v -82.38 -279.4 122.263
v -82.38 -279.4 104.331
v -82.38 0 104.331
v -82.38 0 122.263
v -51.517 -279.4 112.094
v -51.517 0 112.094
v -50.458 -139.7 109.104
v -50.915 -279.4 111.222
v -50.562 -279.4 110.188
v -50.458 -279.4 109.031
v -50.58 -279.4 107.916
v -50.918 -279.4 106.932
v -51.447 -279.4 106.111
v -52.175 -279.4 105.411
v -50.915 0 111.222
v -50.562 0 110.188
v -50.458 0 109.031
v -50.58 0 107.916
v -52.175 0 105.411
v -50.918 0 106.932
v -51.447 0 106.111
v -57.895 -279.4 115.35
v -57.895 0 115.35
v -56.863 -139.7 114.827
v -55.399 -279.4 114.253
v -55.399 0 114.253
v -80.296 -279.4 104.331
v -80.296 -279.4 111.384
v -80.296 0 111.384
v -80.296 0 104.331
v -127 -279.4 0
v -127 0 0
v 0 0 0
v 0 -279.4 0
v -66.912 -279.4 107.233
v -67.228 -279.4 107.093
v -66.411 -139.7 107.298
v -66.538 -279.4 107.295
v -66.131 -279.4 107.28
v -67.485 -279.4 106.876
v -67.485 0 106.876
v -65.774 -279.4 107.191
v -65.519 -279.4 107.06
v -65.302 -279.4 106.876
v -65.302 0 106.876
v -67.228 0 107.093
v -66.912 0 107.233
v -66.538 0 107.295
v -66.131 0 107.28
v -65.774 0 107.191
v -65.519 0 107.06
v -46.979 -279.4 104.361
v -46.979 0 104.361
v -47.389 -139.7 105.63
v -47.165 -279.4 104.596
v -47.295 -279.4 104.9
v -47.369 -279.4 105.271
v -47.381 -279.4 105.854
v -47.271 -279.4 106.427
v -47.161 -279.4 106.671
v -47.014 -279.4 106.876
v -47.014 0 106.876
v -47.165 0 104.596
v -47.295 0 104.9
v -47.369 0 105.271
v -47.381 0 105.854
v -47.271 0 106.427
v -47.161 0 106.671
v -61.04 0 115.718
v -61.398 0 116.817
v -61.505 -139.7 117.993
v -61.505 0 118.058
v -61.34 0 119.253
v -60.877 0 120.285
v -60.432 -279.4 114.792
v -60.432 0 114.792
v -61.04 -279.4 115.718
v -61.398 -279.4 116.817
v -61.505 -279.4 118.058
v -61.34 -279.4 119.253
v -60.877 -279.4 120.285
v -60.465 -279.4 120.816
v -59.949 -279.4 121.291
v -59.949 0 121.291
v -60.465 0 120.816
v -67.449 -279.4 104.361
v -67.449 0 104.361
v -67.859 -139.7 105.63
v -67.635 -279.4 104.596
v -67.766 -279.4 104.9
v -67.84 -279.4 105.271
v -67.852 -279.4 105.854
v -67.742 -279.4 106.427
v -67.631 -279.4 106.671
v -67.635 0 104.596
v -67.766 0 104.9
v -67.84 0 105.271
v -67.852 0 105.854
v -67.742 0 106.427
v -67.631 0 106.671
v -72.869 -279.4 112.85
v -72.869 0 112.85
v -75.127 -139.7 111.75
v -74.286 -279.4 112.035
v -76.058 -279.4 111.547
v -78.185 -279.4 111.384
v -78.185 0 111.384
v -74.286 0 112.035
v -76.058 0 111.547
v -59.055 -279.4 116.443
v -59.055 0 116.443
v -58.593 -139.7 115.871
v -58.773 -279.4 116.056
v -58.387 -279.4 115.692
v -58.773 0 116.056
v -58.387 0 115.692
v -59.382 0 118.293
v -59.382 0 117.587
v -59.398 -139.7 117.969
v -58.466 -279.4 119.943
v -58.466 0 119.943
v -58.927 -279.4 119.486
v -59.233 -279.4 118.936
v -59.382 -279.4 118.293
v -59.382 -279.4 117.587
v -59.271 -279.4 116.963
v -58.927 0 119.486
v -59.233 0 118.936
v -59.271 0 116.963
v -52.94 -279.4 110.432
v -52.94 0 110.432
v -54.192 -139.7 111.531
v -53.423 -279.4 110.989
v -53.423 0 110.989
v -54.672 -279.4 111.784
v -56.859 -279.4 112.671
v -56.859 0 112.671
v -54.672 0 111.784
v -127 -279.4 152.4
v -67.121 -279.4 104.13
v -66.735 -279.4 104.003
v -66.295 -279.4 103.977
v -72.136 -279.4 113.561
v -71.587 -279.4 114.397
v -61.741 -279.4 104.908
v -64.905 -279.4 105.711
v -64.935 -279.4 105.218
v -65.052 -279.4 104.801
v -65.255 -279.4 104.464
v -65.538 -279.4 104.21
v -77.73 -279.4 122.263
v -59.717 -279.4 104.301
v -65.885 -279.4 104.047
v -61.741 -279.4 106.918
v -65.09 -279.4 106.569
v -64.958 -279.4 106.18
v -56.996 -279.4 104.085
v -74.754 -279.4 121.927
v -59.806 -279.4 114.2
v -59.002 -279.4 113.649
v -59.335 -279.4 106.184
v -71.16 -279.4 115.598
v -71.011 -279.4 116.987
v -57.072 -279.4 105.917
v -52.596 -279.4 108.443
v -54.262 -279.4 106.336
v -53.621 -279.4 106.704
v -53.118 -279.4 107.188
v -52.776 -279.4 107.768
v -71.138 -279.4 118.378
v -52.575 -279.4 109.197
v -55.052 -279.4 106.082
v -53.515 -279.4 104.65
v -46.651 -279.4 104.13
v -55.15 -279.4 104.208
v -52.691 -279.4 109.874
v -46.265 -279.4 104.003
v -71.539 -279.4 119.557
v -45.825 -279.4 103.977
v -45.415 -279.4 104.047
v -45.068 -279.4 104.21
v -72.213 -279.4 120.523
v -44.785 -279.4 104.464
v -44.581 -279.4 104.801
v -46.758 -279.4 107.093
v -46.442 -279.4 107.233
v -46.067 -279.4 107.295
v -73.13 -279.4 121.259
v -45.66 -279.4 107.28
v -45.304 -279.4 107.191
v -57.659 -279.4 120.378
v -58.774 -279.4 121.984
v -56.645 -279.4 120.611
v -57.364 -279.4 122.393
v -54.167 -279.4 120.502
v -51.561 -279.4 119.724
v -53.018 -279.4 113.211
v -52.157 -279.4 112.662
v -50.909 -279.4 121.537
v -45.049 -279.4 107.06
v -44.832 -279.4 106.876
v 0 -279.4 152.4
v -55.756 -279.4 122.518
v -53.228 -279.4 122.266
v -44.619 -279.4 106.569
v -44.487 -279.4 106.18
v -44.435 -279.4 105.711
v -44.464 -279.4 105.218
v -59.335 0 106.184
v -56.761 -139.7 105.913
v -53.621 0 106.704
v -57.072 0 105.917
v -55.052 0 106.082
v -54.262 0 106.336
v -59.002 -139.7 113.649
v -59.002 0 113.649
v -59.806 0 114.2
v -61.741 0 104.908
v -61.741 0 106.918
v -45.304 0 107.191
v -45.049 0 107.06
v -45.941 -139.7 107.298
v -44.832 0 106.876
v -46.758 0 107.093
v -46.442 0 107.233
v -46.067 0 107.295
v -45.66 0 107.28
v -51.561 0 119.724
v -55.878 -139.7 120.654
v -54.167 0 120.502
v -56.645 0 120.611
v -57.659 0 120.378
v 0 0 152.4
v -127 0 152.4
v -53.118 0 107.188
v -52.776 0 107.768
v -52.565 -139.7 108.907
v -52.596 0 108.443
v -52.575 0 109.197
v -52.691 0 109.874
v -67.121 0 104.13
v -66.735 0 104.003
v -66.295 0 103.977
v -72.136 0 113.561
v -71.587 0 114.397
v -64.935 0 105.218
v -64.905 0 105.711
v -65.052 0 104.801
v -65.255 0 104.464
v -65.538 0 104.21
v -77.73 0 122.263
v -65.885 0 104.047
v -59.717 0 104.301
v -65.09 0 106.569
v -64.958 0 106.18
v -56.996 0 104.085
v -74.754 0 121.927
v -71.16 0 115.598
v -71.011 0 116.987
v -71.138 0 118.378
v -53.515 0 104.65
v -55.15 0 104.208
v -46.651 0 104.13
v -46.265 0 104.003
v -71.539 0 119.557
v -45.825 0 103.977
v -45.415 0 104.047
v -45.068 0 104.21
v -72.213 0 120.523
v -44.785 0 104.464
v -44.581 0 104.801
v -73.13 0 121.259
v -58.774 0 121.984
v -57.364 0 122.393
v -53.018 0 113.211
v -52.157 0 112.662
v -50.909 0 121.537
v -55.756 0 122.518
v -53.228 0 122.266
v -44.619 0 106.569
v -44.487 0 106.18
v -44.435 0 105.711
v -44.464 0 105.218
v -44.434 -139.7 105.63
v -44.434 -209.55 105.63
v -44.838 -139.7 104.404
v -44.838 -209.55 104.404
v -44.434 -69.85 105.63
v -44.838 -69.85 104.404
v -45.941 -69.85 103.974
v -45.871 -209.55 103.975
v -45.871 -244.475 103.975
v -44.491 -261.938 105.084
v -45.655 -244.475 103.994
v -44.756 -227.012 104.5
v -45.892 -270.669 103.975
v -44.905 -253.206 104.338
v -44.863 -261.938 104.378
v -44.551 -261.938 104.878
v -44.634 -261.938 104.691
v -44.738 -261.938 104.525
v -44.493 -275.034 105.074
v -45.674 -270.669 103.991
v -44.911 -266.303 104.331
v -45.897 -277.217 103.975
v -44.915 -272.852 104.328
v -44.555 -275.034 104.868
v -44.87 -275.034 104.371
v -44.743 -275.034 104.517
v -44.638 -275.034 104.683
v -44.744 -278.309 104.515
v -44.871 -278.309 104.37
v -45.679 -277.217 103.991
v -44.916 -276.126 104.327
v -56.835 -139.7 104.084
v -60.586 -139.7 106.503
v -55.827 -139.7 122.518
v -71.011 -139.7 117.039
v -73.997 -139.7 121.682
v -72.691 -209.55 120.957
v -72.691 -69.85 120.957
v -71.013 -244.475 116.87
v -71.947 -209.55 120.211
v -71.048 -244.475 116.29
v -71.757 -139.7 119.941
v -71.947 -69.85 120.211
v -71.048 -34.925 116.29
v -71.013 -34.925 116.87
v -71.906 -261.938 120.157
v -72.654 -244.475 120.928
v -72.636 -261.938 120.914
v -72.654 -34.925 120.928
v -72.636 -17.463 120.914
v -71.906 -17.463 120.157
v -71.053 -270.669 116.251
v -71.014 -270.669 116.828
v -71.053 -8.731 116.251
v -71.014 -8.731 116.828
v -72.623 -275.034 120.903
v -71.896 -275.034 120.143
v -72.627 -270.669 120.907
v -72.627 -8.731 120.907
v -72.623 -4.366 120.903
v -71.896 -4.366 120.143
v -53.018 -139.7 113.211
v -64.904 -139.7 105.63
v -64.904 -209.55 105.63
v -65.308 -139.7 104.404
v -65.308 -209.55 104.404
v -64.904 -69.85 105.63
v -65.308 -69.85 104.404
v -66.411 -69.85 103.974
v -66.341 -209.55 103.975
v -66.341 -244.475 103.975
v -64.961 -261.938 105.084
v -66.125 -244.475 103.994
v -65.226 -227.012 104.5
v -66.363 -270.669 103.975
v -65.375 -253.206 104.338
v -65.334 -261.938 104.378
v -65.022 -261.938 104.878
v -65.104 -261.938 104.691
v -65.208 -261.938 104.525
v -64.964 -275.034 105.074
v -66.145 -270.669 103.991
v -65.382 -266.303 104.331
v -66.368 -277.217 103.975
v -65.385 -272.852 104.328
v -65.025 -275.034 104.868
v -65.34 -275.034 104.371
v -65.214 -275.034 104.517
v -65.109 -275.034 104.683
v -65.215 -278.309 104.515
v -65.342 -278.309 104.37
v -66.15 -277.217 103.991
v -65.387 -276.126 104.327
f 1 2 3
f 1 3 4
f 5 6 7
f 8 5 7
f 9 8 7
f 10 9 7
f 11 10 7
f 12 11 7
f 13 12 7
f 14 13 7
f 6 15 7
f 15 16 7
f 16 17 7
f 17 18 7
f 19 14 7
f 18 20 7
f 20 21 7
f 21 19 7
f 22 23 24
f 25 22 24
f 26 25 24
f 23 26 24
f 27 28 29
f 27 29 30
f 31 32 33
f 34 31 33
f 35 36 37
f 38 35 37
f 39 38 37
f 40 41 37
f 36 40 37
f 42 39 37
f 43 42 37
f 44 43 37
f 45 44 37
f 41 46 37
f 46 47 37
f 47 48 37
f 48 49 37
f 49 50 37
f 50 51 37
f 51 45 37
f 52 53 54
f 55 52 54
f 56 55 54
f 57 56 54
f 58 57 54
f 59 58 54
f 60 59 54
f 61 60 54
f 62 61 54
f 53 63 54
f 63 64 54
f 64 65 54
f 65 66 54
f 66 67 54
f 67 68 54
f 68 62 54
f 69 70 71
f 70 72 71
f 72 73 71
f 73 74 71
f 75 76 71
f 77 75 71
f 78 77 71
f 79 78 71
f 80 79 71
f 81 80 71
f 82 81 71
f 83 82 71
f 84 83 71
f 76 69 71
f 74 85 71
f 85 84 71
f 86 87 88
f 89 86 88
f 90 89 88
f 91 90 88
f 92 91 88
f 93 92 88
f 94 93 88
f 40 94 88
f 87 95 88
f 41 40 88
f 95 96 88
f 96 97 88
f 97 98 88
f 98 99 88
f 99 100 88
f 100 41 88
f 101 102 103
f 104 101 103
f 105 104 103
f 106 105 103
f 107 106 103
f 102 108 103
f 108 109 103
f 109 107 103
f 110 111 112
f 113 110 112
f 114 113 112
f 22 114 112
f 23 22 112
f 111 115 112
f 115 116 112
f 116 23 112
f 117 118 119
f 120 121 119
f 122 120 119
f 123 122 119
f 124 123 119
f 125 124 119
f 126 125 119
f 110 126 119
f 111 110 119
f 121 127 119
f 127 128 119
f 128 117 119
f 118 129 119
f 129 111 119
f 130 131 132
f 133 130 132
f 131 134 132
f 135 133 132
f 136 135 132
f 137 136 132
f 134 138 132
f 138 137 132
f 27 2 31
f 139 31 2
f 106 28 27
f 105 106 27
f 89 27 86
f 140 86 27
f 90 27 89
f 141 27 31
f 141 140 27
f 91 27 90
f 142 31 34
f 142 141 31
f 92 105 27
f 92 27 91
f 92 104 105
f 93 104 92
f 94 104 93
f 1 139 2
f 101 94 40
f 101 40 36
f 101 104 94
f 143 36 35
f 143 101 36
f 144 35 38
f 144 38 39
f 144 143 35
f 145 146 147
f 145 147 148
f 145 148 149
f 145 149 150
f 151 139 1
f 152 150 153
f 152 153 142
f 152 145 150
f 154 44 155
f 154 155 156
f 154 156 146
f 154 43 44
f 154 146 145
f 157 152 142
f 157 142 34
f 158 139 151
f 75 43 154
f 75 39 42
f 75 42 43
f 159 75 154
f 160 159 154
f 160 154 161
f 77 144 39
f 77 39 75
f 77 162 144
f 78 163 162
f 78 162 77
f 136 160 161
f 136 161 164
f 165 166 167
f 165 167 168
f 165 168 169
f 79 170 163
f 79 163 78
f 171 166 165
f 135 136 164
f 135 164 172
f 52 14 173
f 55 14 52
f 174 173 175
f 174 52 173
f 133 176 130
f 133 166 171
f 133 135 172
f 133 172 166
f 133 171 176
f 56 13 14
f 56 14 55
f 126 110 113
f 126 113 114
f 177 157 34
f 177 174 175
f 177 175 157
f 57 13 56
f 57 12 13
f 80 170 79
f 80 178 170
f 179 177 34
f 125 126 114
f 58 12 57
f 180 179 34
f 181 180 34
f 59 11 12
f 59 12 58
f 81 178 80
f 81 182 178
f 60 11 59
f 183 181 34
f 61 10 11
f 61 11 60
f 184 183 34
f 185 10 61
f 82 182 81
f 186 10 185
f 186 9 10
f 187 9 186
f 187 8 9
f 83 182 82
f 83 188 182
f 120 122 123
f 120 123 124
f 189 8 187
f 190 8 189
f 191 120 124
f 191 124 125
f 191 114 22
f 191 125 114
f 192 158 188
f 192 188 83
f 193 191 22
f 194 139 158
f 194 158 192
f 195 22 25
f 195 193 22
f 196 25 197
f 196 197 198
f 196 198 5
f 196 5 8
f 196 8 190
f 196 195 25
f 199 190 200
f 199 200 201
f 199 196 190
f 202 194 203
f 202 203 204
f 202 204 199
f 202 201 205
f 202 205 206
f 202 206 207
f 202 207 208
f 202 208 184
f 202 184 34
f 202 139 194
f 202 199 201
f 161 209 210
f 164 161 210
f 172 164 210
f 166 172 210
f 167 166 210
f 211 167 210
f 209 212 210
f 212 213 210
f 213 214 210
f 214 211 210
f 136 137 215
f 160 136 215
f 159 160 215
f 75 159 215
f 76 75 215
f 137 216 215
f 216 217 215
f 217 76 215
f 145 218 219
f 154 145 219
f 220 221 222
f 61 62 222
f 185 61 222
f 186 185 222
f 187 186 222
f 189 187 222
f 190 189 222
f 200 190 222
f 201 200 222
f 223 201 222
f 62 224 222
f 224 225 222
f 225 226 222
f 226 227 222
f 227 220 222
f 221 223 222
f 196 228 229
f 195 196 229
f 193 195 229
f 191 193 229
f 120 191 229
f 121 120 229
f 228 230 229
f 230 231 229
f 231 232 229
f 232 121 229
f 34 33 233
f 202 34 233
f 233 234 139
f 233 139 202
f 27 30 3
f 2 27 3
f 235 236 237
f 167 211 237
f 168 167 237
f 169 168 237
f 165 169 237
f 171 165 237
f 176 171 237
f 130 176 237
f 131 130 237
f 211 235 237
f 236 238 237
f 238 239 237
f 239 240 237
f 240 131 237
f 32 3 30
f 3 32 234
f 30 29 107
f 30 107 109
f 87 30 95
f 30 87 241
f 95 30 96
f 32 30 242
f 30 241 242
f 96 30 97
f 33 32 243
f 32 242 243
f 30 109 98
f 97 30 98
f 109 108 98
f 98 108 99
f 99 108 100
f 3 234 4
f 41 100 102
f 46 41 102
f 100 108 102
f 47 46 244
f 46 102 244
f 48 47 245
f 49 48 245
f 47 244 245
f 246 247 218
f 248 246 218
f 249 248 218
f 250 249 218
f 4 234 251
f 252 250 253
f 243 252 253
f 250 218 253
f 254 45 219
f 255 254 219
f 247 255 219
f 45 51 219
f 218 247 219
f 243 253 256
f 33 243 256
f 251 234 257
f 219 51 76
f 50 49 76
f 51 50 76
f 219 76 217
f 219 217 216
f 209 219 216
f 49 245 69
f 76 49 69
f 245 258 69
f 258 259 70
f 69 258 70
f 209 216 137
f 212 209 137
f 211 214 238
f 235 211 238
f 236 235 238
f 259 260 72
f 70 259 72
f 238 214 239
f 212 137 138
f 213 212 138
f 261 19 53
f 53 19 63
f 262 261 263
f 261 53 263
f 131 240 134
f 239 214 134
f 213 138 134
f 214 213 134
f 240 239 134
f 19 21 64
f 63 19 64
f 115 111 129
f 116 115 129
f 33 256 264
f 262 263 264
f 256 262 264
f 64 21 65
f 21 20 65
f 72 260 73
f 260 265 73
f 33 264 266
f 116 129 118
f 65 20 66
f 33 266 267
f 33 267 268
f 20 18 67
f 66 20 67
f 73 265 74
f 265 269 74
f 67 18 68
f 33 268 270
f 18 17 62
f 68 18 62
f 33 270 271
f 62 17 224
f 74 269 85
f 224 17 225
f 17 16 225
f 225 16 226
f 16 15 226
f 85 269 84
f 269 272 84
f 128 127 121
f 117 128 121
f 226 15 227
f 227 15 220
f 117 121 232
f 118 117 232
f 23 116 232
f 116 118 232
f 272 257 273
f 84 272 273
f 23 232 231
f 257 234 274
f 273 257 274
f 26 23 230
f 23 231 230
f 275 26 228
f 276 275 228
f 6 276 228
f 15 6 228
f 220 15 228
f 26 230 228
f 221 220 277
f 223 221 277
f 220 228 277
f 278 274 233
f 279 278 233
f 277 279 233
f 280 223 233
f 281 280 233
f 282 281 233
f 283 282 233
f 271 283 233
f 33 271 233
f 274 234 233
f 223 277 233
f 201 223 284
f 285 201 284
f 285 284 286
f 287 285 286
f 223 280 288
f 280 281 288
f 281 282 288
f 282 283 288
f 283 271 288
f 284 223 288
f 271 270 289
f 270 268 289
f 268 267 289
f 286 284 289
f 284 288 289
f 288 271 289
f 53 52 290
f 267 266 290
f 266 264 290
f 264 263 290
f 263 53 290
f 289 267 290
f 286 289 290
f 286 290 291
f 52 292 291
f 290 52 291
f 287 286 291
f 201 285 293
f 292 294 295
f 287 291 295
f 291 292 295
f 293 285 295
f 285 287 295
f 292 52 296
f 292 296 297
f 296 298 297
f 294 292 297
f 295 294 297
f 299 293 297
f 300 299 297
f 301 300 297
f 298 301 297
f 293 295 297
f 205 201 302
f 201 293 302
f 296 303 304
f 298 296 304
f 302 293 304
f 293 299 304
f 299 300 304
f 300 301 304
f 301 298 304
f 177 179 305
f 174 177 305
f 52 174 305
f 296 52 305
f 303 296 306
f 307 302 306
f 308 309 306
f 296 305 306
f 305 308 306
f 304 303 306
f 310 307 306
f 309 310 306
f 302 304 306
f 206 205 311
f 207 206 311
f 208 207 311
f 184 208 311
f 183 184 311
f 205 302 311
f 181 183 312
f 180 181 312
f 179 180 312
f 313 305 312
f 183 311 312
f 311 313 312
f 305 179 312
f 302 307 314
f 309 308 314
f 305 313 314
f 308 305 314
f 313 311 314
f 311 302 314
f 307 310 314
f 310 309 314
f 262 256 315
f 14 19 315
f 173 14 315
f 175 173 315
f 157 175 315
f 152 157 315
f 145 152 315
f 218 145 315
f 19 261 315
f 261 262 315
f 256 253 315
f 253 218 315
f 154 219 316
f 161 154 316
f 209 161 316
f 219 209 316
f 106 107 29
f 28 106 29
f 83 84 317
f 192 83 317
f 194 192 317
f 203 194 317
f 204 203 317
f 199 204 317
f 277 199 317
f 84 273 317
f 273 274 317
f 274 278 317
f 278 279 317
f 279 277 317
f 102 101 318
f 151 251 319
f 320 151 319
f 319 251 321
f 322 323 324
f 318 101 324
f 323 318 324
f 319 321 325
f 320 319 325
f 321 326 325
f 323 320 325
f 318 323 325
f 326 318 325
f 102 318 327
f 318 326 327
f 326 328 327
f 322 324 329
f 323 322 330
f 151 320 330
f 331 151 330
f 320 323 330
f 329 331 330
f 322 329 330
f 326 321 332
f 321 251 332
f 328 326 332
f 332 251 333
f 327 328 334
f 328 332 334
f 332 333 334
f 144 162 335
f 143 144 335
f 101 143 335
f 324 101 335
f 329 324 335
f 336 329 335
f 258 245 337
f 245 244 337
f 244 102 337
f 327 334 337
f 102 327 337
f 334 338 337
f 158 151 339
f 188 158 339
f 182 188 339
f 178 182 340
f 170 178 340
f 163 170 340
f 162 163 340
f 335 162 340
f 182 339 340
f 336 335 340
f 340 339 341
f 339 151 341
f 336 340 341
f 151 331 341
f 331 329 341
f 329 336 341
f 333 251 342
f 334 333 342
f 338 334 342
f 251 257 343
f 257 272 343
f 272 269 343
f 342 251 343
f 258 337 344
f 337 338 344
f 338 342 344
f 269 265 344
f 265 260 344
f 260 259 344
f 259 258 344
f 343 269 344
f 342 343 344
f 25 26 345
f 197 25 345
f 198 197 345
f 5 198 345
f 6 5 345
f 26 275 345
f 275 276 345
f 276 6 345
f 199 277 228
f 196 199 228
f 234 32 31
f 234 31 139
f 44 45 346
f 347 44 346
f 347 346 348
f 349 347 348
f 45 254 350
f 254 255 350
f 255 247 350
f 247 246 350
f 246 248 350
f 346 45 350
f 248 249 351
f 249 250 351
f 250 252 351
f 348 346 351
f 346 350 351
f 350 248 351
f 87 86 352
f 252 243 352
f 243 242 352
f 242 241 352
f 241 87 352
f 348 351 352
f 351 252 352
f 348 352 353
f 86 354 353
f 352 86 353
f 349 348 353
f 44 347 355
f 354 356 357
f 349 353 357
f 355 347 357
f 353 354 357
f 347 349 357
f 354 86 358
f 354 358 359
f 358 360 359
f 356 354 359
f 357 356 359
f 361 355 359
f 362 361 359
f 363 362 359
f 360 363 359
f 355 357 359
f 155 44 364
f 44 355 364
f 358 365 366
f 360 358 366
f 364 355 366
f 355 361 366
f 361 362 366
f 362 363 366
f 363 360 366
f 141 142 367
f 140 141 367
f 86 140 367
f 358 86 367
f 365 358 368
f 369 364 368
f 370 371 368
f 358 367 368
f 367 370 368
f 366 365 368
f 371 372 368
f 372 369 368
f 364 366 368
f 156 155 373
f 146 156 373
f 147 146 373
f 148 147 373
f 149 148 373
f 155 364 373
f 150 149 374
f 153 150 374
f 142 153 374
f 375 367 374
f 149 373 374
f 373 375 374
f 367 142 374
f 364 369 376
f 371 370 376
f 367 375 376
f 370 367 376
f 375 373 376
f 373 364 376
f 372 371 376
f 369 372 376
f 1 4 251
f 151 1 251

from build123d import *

# Parameters (mm, degrees)
F0_W     = 127
F0_H     = 152.4
F1_DEPTH = 279.4


with BuildPart() as f1:
    # F0 (on Front) → F1 (new body)
    with BuildSketch(Plane.XZ):
        with Locations((-63.5, 76.2)):
            Rectangle(F0_W, F0_H)
        with BuildLine():
            add(Edge.make_bspline(
                [(-77.7296743618, 122.2627671523), (-71.0107954947, 122.2627671523), (-71.0107954947, 117.0391527994)],
                knots=[0, 0, 0, 1, 1, 1], degree=2))
            add(Edge.make_bspline(
                [(-71.0107954947, 117.0391527994), (-71.0107954947, 114.3154951278), (-72.8690835458, 112.8496649544)],
                knots=[0, 0, 0, 1, 1, 1], degree=2))
            add(Edge.make_bspline(
                [(-72.8690835458, 112.8496649544), (-74.727371597, 111.383834781), (-78.1849255, 111.383834781)],
                knots=[0, 0, 0, 1, 1, 1], degree=2))
            Line((-78.1849255, 111.383834781), (-80.2963488823, 111.383834781))
            Line((-80.2963488823, 111.383834781), (-80.2963488823, 104.3313667178))
            Line((-80.2963488823, 104.3313667178), (-82.3803002131, 104.3313667178))
            Line((-82.3803002131, 104.3313667178), (-82.3803002131, 122.2627671523))
            Line((-82.3803002131, 122.2627671523), (-77.7296743618, 122.2627671523))
        make_face(mode=Mode.SUBTRACT)
        with BuildLine():
            add(Edge.make_bspline(
                [(-67.4492402541, 104.3608010586), (-67.8593587363, 104.7473720682), (-67.8593587363, 105.6304022932)],
                knots=[0, 0, 0, 1, 1, 1], degree=2))
            add(Edge.make_bspline(
                [(-67.8593587363, 105.6304022932), (-67.8593587363, 106.4545638365), (-67.4845614631, 106.876456055)],
                knots=[0, 0, 0, 1, 1, 1], degree=2))
            add(Edge.make_bspline(
                [(-67.4845614631, 106.876456055), (-67.1097641898, 107.2983482736), (-66.4111891674, 107.2983482736)],
                knots=[0, 0, 0, 1, 1, 1], degree=2))
            add(Edge.make_bspline(
                [(-66.4111891674, 107.2983482736), (-65.7008404087, 107.2983482736), (-65.3024956628, 106.876456055)],
                knots=[0, 0, 0, 1, 1, 1], degree=2))
            add(Edge.make_bspline(
                [(-65.3024956628, 106.876456055), (-64.9041509168, 106.4545638365), (-64.9041509168, 105.6304022932)],
                knots=[0, 0, 0, 1, 1, 1], degree=2))
            add(Edge.make_bspline(
                [(-64.9041509168, 105.6304022932), (-64.9041509168, 104.8337128013), (-65.3083825309, 104.4039714252)],
                knots=[0, 0, 0, 1, 1, 1], degree=2))
            add(Edge.make_bspline(
                [(-65.3083825309, 104.4039714252), (-65.712614145, 103.9742300491), (-66.4111891674, 103.9742300491)],
                knots=[0, 0, 0, 1, 1, 1], degree=2))
            add(Edge.make_bspline(
                [(-66.4111891674, 103.9742300491), (-67.0391217718, 103.9742300491), (-67.4492402541, 104.3608010586)],
                knots=[0, 0, 0, 1, 1, 1], degree=2))
        make_face(mode=Mode.SUBTRACT)
        with BuildLine():
            add(Edge.make_bspline(
                [(-51.5174127067, 112.0941835397), (-50.4577764368, 110.9403573791), (-50.4577764368, 109.1036545113)],
                knots=[0, 0, 0, 1, 1, 1], degree=2))
            add(Edge.make_bspline(
                [(-50.4577764368, 109.1036545113), (-50.4577764368, 106.7371335084), (-52.174779652, 105.4106258816)],
                knots=[0, 0, 0, 1, 1, 1], degree=2))
            add(Edge.make_bspline(
                [(-52.174779652, 105.4106258816), (-53.8917828671, 104.0841182548), (-56.8352169503, 104.0841182548)],
                knots=[0, 0, 0, 1, 1, 1], degree=2))
            add(Edge.make_bspline(
                [(-56.8352169503, 104.0841182548), (-60.0219749176, 104.0841182548), (-61.7409404222, 104.9082797981)],
                knots=[0, 0, 0, 1, 1, 1], degree=2))
            Line((-61.7409404222, 104.9082797981), (-61.7409404222, 106.9176641322))
            add(Edge.make_bspline(
                [(-61.7409404222, 106.9176641322), (-60.6342092069, 106.4545638365), (-59.3351736316, 106.1837679008)],
                knots=[0, 0, 0, 1, 1, 1], degree=2))
            add(Edge.make_bspline(
                [(-59.3351736316, 106.1837679008), (-58.0361380562, 105.9129719652), (-56.7606499535, 105.9129719652)],
                knots=[0, 0, 0, 1, 1, 1], degree=2))
            add(Edge.make_bspline(
                [(-56.7606499535, 105.9129719652), (-54.6766986226, 105.9129719652), (-53.6209869315, 106.7037745888)],
                knots=[0, 0, 0, 1, 1, 1], degree=2))
            add(Edge.make_bspline(
                [(-53.6209869315, 106.7037745888), (-52.5652752403, 107.4945772125), (-52.5652752403, 108.9074255724)],
                knots=[0, 0, 0, 1, 1, 1], degree=2))
            add(Edge.make_bspline(
                [(-52.5652752403, 108.9074255724), (-52.5652752403, 109.8375507427), (-52.9400725136, 110.4321244275)],
                knots=[0, 0, 0, 1, 1, 1], degree=2))
            add(Edge.make_bspline(
                [(-52.9400725136, 110.4321244275), (-53.3148697868, 111.0266981123), (-54.1920131436, 111.5310064852)],
                knots=[0, 0, 0, 1, 1, 1], degree=2))
            add(Edge.make_bspline(
                [(-54.1920131436, 111.5310064852), (-55.0691565004, 112.0353148581), (-56.8587644229, 112.67109662)],
                knots=[0, 0, 0, 1, 1, 1], degree=2))
            add(Edge.make_bspline(
                [(-56.8587644229, 112.67109662), (-59.3587211042, 113.5659005813), (-60.4320933999, 114.7923314493)],
                knots=[0, 0, 0, 1, 1, 1], degree=2))
            add(Edge.make_bspline(
                [(-60.4320933999, 114.7923314493), (-61.5054656955, 116.0187623173), (-61.5054656955, 117.9928254423)],
                knots=[0, 0, 0, 1, 1, 1], degree=2))
            add(Edge.make_bspline(
                [(-61.5054656955, 117.9928254423), (-61.5054656955, 120.0650030369), (-59.9493702102, 121.2914339048)],
                knots=[0, 0, 0, 1, 1, 1], degree=2))
            add(Edge.make_bspline(
                [(-59.9493702102, 121.2914339048), (-58.3932747249, 122.5178647728), (-55.8266002045, 122.5178647728)],
                knots=[0, 0, 0, 1, 1, 1], degree=2))
            add(Edge.make_bspline(
                [(-55.8266002045, 122.5178647728), (-53.153962057, 122.5178647728), (-50.9091029962, 121.5367200784)],
                knots=[0, 0, 0, 1, 1, 1], degree=2))
            Line((-50.9091029962, 121.5367200784), (-51.5605830733, 119.7235646832))
            add(Edge.make_bspline(
                [(-51.5605830733, 119.7235646832), (-53.7818946614, 120.6536898535), (-55.8776197286, 120.6536898535)],
                knots=[0, 0, 0, 1, 1, 1], degree=2))
            add(Edge.make_bspline(
                [(-55.8776197286, 120.6536898535), (-57.5337919727, 120.6536898535), (-58.4658794323, 119.9433410948)],
                knots=[0, 0, 0, 1, 1, 1], degree=2))
            add(Edge.make_bspline(
                [(-58.4658794323, 119.9433410948), (-59.397966892, 119.232992336), (-59.397966892, 117.9692779697)],
                knots=[0, 0, 0, 1, 1, 1], degree=2))
            add(Edge.make_bspline(
                [(-59.397966892, 117.9692779697), (-59.397966892, 117.0391527994), (-59.054566249, 116.4426168252)],
                knots=[0, 0, 0, 1, 1, 1], degree=2))
            add(Edge.make_bspline(
                [(-59.054566249, 116.4426168252), (-58.7111656059, 115.846080851), (-57.8948532202, 115.3496216357)],
                knots=[0, 0, 0, 1, 1, 1], degree=2))
            add(Edge.make_bspline(
                [(-57.8948532202, 115.3496216357), (-57.0785408345, 114.8531624203), (-55.3988211177, 114.2527018674)],
                knots=[0, 0, 0, 1, 1, 1], degree=2))
            add(Edge.make_bspline(
                [(-55.3988211177, 114.2527018674), (-52.5770489767, 113.2480097003), (-51.5174127067, 112.0941835397)],
                knots=[0, 0, 0, 1, 1, 1], degree=2))
        make_face(mode=Mode.SUBTRACT)
        with BuildLine():
            add(Edge.make_bspline(
                [(-46.9786373505, 104.3608010586), (-47.3887558328, 104.7473720682), (-47.3887558328, 105.6304022932)],
                knots=[0, 0, 0, 1, 1, 1], degree=2))
            add(Edge.make_bspline(
                [(-47.3887558328, 105.6304022932), (-47.3887558328, 106.4545638365), (-47.0139585595, 106.876456055)],
                knots=[0, 0, 0, 1, 1, 1], degree=2))
            add(Edge.make_bspline(
                [(-47.0139585595, 106.876456055), (-46.6391612863, 107.2983482736), (-45.9405862639, 107.2983482736)],
                knots=[0, 0, 0, 1, 1, 1], degree=2))
            add(Edge.make_bspline(
                [(-45.9405862639, 107.2983482736), (-45.2302375052, 107.2983482736), (-44.8318927592, 106.876456055)],
                knots=[0, 0, 0, 1, 1, 1], degree=2))
            add(Edge.make_bspline(
                [(-44.8318927592, 106.876456055), (-44.4335480133, 106.4545638365), (-44.4335480133, 105.6304022932)],
                knots=[0, 0, 0, 1, 1, 1], degree=2))
            add(Edge.make_bspline(
                [(-44.4335480133, 105.6304022932), (-44.4335480133, 104.8337128013), (-44.8377796274, 104.4039714252)],
                knots=[0, 0, 0, 1, 1, 1], degree=2))
            add(Edge.make_bspline(
                [(-44.8377796274, 104.4039714252), (-45.2420112415, 103.9742300491), (-45.9405862639, 103.9742300491)],
                knots=[0, 0, 0, 1, 1, 1], degree=2))
            add(Edge.make_bspline(
                [(-45.9405862639, 103.9742300491), (-46.5685188683, 103.9742300491), (-46.9786373505, 104.3608010586)],
                knots=[0, 0, 0, 1, 1, 1], degree=2))
        make_face(mode=Mode.SUBTRACT)
    extrude(amount=F1_DEPTH)


solid = f1.part
